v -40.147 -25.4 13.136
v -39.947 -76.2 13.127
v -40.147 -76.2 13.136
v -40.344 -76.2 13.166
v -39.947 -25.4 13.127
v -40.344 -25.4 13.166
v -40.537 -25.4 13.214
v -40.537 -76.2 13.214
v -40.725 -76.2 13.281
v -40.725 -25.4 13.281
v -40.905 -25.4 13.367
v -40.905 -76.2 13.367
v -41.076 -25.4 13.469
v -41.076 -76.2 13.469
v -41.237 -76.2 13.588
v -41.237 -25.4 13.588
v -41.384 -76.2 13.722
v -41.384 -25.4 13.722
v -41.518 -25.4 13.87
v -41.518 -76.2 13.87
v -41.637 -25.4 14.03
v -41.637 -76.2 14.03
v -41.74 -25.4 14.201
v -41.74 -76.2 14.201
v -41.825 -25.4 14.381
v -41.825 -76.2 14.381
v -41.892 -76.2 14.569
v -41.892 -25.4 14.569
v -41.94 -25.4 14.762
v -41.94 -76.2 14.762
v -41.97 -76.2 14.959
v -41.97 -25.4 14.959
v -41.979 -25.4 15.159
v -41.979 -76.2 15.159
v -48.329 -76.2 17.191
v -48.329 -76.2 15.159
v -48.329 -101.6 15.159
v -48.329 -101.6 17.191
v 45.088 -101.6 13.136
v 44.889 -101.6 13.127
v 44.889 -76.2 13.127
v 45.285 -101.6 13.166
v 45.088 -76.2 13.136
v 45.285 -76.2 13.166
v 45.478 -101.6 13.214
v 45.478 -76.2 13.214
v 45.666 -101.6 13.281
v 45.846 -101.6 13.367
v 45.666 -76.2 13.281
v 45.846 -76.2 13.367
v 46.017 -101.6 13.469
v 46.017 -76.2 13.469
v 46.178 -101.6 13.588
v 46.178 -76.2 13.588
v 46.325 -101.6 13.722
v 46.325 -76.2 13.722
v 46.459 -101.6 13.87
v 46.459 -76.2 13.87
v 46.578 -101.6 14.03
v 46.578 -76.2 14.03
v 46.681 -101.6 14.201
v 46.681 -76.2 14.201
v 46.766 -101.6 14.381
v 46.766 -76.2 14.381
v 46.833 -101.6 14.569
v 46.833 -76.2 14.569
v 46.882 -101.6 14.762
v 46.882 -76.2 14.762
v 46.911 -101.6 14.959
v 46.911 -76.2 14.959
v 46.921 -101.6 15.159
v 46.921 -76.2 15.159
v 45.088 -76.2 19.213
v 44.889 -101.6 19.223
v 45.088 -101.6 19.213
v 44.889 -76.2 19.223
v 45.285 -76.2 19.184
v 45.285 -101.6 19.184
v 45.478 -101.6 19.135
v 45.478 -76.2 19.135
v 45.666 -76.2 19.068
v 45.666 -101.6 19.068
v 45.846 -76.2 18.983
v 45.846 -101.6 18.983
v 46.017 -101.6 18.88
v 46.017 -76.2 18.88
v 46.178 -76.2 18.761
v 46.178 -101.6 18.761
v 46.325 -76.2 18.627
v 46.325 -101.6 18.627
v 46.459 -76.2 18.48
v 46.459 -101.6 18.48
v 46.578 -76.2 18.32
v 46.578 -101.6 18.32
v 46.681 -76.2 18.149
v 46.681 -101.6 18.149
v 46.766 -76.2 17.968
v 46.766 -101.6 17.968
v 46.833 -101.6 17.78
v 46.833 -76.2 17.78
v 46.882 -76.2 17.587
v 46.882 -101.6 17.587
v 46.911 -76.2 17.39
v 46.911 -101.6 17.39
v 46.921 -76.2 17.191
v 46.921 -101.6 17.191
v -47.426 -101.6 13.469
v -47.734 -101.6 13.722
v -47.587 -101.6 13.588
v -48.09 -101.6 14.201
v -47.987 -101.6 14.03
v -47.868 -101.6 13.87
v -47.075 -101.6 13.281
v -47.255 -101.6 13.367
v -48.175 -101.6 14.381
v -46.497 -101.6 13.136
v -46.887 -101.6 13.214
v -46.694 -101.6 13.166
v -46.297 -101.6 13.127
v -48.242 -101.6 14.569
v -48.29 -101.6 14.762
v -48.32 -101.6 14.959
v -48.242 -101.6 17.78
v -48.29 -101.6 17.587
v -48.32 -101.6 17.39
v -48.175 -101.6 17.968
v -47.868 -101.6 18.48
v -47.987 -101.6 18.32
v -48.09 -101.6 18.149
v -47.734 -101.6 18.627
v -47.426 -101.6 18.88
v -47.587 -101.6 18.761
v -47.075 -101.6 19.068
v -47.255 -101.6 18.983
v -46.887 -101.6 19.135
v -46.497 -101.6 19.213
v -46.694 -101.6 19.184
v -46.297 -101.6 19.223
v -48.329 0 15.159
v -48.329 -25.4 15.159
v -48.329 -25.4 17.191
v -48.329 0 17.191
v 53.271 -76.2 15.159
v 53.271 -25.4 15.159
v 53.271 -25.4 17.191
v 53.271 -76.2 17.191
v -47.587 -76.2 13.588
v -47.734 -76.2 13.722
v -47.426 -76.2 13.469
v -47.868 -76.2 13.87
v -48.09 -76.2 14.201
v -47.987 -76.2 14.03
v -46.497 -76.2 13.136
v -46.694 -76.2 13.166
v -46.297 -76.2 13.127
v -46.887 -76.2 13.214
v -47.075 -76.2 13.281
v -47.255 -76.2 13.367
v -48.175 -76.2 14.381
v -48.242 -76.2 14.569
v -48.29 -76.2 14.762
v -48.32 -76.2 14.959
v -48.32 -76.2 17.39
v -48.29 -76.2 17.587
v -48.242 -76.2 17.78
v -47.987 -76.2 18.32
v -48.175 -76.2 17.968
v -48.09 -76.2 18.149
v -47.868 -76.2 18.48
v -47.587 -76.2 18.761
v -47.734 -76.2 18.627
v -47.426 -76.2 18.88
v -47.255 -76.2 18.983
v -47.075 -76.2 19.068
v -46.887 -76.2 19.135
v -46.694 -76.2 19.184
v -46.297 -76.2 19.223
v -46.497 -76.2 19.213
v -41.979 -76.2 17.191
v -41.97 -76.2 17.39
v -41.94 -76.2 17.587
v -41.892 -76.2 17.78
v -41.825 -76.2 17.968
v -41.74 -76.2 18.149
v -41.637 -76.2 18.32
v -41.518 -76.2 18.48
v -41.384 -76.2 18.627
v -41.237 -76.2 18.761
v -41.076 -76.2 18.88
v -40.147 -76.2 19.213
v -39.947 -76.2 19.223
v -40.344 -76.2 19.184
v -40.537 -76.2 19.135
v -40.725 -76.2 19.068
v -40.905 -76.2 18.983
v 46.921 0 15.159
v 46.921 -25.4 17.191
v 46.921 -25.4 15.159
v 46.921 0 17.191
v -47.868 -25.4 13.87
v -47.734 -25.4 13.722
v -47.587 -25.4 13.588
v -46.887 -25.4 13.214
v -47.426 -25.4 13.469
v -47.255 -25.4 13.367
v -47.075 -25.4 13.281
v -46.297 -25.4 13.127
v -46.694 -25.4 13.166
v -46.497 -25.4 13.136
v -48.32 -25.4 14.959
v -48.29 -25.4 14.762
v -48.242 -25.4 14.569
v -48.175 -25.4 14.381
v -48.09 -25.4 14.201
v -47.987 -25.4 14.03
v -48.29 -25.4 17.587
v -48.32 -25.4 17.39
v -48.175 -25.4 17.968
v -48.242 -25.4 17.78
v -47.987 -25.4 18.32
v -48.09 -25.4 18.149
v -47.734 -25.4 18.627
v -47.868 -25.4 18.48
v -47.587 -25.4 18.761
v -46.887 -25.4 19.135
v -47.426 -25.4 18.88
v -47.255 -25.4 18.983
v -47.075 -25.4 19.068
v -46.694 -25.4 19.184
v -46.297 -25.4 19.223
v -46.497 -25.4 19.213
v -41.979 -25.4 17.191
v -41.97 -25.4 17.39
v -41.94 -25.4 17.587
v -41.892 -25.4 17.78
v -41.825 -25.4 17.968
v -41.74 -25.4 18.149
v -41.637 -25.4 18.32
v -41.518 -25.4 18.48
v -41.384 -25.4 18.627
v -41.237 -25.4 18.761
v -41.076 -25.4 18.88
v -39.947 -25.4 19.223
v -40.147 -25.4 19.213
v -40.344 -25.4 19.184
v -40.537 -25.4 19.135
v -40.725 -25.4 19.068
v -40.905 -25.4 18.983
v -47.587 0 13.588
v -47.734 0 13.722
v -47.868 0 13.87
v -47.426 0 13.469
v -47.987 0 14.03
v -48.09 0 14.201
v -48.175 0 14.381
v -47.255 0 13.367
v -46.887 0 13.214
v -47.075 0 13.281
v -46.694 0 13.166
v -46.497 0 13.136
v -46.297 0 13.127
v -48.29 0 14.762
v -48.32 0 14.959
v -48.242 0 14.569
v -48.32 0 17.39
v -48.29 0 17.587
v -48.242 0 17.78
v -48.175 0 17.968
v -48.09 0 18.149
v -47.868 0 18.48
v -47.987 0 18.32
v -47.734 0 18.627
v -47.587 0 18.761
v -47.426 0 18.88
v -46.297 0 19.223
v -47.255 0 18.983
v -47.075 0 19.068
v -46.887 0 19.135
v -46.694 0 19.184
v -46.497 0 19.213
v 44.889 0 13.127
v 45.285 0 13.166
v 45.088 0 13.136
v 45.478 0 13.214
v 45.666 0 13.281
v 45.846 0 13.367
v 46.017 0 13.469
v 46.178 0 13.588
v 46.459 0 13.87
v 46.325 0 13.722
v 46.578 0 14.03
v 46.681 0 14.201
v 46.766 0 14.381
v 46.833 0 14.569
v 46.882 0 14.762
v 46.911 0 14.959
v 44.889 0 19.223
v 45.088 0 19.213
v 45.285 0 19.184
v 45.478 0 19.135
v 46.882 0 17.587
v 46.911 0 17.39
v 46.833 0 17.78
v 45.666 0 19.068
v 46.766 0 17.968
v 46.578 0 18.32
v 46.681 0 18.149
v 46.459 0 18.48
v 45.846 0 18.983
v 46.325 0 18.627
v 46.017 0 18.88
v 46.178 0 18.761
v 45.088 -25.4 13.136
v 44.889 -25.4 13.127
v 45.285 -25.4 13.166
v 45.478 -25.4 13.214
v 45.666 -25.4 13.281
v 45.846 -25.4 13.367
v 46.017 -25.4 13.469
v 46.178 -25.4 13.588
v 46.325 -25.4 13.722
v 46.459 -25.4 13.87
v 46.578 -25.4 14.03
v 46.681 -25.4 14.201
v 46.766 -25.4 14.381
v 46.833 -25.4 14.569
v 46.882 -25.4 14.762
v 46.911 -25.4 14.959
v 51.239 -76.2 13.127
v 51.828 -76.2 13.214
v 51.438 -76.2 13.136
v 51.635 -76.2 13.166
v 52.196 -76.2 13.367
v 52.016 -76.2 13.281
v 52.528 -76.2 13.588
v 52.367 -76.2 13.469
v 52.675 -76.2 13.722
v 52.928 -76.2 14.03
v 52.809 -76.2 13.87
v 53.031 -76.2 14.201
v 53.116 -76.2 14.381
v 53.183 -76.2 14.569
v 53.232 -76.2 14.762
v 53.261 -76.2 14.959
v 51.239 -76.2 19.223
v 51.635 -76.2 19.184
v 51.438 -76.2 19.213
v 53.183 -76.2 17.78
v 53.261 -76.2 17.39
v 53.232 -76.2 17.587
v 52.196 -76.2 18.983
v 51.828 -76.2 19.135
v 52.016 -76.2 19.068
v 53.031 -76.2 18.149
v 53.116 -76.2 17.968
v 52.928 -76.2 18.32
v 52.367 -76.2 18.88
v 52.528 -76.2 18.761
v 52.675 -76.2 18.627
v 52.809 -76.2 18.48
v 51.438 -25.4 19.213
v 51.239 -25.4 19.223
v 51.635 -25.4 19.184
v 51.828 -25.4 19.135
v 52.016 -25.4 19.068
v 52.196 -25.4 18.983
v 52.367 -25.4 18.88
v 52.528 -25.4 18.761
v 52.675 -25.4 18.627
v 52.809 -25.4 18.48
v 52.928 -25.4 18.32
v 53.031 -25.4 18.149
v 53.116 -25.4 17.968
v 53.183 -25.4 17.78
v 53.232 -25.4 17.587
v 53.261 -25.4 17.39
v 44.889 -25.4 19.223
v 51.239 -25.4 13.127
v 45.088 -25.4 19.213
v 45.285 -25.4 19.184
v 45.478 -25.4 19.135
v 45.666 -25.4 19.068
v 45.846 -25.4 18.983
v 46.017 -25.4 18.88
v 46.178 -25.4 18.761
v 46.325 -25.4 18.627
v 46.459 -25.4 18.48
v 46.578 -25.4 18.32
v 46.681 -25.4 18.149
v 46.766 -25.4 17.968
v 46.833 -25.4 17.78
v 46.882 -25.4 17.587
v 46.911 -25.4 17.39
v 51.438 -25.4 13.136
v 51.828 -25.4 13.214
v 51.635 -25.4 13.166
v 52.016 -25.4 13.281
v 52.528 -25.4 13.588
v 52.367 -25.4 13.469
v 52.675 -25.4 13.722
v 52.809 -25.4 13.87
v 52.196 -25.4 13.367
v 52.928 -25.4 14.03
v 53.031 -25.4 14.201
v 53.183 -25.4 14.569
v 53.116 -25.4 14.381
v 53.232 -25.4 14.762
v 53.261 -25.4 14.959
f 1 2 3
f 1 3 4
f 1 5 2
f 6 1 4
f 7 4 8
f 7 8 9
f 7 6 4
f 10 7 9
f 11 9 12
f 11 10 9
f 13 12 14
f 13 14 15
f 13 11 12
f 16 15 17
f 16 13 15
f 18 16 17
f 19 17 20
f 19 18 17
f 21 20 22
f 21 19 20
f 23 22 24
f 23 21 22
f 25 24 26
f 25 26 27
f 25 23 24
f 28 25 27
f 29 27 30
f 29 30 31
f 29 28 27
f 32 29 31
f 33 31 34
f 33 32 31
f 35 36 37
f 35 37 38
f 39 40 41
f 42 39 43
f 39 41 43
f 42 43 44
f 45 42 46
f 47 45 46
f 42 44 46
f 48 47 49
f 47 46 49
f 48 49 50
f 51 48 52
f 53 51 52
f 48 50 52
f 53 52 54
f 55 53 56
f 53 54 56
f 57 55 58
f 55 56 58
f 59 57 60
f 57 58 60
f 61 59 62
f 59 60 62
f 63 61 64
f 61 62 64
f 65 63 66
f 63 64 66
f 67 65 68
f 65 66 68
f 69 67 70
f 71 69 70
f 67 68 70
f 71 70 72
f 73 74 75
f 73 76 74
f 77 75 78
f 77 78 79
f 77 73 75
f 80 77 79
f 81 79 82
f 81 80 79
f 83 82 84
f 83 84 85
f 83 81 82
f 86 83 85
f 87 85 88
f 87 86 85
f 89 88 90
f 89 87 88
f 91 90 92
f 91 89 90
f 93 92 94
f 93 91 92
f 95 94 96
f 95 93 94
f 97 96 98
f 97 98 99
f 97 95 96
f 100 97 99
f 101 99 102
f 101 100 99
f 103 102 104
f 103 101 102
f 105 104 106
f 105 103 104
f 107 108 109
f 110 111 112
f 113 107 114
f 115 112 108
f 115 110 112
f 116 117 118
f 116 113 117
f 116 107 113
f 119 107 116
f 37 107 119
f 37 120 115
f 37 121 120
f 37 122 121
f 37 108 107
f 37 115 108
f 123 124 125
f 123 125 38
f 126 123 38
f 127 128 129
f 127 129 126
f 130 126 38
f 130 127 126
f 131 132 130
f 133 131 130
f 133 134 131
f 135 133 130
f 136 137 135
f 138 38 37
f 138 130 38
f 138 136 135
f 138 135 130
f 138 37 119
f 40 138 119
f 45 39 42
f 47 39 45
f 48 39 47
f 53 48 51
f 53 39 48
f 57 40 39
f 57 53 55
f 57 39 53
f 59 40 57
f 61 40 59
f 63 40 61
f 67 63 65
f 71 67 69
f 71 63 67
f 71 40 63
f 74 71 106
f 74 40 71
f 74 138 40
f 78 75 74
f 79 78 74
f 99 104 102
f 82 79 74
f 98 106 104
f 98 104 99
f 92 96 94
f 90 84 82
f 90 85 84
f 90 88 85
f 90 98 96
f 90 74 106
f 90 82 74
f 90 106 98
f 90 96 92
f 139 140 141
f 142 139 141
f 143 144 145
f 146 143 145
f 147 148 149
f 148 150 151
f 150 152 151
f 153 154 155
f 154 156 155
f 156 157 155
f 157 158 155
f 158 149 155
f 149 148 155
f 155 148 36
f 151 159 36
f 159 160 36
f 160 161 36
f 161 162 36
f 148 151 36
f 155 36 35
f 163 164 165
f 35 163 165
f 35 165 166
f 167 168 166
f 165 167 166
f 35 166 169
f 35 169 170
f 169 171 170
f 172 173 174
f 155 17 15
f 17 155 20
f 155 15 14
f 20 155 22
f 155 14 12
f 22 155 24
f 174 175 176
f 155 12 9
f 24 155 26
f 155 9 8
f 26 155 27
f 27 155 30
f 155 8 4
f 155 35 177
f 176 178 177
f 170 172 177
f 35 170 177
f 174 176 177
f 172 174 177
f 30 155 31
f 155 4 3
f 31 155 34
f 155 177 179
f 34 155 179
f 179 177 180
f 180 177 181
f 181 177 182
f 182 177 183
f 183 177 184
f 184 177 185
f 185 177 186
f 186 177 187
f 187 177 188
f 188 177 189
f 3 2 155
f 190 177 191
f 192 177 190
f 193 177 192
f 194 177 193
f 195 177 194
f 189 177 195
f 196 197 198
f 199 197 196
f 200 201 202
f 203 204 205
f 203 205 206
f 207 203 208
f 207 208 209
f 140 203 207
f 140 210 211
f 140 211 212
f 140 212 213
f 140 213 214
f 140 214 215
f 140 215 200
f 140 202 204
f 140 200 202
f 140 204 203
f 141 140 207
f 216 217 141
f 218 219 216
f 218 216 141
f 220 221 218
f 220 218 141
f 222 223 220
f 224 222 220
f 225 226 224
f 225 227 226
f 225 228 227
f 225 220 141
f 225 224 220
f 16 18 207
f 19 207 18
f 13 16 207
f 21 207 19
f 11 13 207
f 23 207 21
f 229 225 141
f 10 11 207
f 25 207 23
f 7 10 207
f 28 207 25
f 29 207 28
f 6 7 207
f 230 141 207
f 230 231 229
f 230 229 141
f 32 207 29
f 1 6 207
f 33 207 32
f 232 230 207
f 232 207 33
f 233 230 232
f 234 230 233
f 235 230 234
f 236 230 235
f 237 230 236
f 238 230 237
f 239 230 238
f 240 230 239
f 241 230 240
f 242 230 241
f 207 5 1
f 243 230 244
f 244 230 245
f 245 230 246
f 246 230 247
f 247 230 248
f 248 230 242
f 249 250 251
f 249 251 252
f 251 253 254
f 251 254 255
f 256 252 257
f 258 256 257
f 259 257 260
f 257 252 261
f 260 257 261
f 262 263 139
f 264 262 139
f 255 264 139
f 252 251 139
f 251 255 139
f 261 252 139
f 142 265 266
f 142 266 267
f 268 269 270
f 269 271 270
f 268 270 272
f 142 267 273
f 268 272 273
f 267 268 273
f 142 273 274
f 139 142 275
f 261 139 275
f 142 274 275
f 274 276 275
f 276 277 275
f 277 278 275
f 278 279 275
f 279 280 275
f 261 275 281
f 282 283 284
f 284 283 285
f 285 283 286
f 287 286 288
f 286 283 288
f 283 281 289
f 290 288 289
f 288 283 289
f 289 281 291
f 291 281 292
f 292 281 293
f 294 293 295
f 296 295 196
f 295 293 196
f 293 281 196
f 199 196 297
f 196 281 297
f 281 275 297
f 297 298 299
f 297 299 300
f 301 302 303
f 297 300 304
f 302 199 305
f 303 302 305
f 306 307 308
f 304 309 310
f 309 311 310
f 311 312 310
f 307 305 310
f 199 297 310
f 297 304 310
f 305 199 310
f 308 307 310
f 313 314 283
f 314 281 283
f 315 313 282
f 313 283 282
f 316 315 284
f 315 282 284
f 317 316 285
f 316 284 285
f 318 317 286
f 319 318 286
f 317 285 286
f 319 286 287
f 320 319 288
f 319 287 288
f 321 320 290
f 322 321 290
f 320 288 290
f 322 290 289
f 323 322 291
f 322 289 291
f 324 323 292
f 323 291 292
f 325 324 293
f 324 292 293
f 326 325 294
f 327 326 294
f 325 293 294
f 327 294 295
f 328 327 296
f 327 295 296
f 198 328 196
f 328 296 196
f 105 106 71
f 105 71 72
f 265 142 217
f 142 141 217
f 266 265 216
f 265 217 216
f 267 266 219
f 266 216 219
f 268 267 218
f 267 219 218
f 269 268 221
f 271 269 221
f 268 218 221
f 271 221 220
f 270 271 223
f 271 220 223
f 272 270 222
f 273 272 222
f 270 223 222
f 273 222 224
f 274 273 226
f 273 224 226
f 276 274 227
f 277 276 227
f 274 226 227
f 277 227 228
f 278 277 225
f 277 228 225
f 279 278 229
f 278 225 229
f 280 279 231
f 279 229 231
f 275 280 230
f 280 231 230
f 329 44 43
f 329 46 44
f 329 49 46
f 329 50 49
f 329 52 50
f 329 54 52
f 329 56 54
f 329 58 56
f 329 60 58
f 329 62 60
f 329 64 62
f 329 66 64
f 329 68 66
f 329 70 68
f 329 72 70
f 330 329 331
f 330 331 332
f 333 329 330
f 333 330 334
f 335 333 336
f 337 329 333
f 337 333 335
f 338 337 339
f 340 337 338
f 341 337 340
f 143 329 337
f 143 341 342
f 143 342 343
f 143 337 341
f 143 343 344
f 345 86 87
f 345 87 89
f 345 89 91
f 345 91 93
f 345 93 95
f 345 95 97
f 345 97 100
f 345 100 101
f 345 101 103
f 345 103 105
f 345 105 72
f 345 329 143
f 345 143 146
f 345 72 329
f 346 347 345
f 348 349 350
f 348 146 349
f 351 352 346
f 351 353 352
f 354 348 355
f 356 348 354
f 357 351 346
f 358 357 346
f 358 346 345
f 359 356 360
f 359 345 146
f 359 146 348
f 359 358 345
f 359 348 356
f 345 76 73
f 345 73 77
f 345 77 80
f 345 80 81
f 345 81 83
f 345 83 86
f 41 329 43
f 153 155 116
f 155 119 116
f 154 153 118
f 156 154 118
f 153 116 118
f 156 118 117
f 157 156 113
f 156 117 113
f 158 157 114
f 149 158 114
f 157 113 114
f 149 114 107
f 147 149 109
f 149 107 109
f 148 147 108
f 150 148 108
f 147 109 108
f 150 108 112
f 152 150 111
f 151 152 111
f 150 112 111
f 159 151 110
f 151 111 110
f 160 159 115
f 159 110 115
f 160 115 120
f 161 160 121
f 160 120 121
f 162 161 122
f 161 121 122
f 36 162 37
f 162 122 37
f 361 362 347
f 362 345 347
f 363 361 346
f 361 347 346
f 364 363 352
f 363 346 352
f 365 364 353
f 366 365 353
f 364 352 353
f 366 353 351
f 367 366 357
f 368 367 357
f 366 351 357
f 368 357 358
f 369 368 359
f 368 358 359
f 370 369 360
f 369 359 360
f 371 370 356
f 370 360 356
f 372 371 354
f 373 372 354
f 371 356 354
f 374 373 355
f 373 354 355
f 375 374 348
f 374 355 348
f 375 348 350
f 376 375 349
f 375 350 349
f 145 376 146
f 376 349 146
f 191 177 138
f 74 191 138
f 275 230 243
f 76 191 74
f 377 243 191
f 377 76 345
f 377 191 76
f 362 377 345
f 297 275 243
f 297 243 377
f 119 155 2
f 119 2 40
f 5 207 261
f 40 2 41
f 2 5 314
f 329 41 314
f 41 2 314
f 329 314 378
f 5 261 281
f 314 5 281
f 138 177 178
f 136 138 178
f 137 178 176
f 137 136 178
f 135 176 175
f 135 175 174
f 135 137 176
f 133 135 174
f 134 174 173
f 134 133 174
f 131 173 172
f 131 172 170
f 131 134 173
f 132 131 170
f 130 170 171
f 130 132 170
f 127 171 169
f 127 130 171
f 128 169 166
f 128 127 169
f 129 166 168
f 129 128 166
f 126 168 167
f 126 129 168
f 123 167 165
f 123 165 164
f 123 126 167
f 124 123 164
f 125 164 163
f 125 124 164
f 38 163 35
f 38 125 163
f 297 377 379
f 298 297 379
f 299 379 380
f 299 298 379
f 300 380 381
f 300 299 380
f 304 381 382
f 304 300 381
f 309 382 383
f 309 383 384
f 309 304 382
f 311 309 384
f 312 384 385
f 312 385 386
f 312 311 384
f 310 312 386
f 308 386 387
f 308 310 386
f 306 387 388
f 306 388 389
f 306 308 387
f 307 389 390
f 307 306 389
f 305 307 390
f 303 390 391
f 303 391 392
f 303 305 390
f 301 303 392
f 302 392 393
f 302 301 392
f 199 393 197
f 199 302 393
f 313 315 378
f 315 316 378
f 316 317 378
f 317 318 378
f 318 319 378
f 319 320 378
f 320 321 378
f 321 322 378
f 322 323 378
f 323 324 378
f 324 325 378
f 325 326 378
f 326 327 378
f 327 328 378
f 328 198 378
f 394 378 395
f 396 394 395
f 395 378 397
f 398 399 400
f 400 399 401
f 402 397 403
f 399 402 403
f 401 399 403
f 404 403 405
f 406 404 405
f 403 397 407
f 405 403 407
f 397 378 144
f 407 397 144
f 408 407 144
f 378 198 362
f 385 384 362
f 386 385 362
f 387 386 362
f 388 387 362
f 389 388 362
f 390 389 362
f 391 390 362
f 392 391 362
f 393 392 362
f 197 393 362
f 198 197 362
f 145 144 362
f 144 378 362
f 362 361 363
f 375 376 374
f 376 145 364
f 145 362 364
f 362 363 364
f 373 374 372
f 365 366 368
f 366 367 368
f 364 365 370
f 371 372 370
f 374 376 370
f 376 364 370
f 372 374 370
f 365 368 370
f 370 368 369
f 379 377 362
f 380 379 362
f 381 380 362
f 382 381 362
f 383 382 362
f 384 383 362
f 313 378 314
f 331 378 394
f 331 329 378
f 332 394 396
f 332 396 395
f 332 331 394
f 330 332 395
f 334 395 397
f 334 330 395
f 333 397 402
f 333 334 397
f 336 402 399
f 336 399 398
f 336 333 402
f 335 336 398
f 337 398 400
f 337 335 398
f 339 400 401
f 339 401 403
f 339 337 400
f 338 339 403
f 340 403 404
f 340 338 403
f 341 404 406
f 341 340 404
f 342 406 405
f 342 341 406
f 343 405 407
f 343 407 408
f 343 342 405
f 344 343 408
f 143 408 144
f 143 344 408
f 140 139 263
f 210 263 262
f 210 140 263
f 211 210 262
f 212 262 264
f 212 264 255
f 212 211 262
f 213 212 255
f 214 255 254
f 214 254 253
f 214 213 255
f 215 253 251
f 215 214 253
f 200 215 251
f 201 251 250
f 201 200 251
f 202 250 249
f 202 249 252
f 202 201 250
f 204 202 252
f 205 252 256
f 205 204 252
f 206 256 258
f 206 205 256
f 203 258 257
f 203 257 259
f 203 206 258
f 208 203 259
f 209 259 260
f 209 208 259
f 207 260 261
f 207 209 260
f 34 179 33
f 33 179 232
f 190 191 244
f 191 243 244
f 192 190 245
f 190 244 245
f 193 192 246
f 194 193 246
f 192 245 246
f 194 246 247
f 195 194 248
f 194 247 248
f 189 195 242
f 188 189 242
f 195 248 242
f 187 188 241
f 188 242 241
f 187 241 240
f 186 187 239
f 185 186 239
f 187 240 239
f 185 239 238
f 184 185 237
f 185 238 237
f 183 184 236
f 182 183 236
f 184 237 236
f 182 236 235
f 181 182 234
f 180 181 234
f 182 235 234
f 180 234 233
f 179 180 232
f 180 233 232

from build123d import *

# Parameters (mm, degrees)
F0_W     = 101.6
F0_H     = 6.096
F1_DEPTH = 101.6
F2_W     = 6.35
F2_H     = 50.8
F2_H_2   = 25.4
F3_DEPTH = 25.4
F4_R     = 2.032


with BuildPart() as f1:
    # F0 (on Front) → F1 (new body)
    with BuildSketch(Plane.XZ):
        with Locations((2.470545, 16.174641)):
            Rectangle(F0_W, F0_H)
    extrude(amount=F1_DEPTH)

    # F2 (on face) → F3 (cut)
    with BuildSketch(Plane.XY.offset(19.222641)):
        with Locations((-45.154455, -50.8)):
            Rectangle(F2_W, F2_H)
        with Locations((50.095545, -12.7)):
            Rectangle(F2_W, F2_H_2)
        with Locations((50.095545, -88.9)):
            Rectangle(F2_W, F2_H_2)
    extrude(amount=-F3_DEPTH, mode=Mode.SUBTRACT)

    # F4
    f4_edges = [f1.edges().sort_by_distance(p)[0] for p in [
        (53.270545, -50.8, 19.222641),
        (46.920545, -88.9, 19.222641),
        (46.920545, -12.7, 19.222641),
        (53.270545, -50.8, 13.126641),
        (46.920545, -12.7, 13.126641),
        (46.920545, -88.9, 13.126641),
        (-41.979455, -50.8, 19.222641),
        (-48.329455, -12.7, 19.222641),
        (-48.329455, -88.9, 19.222641),
        (-41.979455, -50.8, 13.126641),
        (-48.329455, -12.7, 13.126641),
        (-48.329455, -88.9, 13.126641),
    ]]
    fillet(f4_edges, radius=F4_R)


solid = f1.part
